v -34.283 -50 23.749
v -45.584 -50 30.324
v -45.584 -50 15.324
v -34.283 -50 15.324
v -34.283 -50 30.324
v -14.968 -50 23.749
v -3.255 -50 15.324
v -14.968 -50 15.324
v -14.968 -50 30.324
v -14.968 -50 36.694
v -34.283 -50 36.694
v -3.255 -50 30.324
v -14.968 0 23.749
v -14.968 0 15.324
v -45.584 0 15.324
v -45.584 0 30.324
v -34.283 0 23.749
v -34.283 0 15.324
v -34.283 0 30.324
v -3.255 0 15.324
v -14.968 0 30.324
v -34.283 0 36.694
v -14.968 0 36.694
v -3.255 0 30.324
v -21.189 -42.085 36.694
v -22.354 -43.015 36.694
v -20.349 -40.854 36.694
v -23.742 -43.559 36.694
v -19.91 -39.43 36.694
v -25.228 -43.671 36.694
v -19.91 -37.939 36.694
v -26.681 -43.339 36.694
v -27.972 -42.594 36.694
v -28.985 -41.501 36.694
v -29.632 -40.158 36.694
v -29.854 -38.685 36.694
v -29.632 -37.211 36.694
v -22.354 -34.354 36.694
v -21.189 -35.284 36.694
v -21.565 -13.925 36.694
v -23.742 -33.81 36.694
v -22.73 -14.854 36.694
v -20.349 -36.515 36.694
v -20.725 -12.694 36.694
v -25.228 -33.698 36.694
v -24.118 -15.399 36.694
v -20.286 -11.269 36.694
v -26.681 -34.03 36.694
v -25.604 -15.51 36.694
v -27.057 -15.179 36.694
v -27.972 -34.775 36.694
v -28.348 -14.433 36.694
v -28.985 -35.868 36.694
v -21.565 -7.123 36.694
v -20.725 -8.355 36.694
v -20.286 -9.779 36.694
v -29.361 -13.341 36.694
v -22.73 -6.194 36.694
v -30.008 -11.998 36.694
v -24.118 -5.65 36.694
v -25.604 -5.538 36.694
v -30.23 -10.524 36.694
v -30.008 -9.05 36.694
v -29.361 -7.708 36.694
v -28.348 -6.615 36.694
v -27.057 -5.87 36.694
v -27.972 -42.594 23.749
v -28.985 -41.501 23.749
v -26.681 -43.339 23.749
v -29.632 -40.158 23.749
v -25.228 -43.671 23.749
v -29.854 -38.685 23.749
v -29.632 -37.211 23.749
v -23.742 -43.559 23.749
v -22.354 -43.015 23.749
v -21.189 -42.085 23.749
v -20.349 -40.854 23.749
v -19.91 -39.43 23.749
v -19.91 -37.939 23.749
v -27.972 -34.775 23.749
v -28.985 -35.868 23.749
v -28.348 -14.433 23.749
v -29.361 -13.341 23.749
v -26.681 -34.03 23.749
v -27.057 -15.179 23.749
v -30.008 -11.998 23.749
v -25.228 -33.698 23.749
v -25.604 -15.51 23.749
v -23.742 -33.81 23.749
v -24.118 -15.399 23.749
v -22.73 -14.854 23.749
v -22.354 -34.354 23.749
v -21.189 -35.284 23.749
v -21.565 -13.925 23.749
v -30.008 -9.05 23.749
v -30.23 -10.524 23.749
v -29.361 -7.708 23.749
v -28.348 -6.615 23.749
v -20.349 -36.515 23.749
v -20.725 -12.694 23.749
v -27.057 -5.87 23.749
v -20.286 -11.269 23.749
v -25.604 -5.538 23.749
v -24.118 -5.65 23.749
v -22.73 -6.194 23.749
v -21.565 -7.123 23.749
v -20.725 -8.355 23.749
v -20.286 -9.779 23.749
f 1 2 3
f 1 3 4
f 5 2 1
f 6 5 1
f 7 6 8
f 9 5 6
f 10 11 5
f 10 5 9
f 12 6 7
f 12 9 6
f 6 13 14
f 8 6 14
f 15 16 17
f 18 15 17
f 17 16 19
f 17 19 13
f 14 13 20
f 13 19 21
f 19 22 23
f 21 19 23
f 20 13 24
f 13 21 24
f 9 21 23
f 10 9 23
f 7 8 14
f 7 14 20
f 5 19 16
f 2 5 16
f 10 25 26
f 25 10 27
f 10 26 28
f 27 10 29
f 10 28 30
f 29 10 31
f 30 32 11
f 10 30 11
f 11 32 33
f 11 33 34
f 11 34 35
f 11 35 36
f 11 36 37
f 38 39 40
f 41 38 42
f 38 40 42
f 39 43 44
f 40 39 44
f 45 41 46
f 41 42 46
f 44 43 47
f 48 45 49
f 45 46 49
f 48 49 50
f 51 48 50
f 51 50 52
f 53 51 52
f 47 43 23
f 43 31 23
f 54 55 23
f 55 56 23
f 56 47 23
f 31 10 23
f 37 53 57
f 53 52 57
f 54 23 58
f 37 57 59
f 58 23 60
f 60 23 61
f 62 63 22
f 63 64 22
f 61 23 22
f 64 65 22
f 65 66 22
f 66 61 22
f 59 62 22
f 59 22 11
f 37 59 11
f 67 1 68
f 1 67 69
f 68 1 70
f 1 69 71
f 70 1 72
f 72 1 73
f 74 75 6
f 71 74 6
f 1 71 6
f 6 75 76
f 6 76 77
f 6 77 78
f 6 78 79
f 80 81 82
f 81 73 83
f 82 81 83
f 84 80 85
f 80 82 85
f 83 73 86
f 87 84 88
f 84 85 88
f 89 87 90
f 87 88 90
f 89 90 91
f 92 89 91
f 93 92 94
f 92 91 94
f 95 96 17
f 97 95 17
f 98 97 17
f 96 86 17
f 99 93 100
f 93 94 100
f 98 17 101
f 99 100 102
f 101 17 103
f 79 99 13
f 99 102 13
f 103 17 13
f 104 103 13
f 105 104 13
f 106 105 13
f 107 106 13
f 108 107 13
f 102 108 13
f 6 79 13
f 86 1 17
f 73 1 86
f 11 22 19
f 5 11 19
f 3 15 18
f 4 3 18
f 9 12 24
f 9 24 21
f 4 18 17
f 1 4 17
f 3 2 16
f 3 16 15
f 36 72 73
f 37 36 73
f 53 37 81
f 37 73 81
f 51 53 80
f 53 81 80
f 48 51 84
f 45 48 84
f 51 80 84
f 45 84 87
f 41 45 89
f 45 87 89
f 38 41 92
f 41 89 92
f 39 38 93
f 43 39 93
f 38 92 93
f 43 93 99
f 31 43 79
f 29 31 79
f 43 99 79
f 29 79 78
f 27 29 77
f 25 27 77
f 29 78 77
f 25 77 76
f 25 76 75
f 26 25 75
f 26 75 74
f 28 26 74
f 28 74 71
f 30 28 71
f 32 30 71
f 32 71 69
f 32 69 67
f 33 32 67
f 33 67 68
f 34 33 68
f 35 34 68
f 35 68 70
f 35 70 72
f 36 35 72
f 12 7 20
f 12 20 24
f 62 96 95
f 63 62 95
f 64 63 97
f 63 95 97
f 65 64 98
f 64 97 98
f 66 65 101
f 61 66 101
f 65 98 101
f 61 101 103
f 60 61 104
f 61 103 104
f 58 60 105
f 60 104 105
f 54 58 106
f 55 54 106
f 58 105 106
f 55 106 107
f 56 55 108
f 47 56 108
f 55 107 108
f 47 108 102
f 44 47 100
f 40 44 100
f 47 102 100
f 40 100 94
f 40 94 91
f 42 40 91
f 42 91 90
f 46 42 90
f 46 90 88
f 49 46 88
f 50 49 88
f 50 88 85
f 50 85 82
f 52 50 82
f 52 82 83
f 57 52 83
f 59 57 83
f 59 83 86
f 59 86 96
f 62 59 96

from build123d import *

# Parameters (mm, degrees)
F1_DEPTH = 50
F3_D     = 10
F4_D     = 10


with BuildPart() as f1:
    # F0 (on Front) → F1 (new body)
    with BuildSketch(Plane.XZ):
        Polygon((-45.584108, 30.324244), (-45.584108, 15.324244), (-34.282739, 15.324244), (-34.282739, 23.748901), (-14.967671, 23.748901), (-14.967671, 15.324244), (-3.255342, 15.324244), (-3.255342, 30.324244), (-14.967671, 30.324244), (-14.967671, 36.694106), (-34.282739, 36.694106), (-34.282739, 30.324244), align=None)
    extrude(amount=F1_DEPTH)

    # F3 (through all)
    with Locations(Plane.XY.offset(36.694106)):
        with Locations((-25.230138, -10.524154)):
            Hole(F3_D / 2)

    # F4 (through all)
    with Locations(Plane.XY.offset(36.694106)):
        with Locations((-24.854114, -38.68451)):
            Hole(F4_D / 2)


solid = f1.part
